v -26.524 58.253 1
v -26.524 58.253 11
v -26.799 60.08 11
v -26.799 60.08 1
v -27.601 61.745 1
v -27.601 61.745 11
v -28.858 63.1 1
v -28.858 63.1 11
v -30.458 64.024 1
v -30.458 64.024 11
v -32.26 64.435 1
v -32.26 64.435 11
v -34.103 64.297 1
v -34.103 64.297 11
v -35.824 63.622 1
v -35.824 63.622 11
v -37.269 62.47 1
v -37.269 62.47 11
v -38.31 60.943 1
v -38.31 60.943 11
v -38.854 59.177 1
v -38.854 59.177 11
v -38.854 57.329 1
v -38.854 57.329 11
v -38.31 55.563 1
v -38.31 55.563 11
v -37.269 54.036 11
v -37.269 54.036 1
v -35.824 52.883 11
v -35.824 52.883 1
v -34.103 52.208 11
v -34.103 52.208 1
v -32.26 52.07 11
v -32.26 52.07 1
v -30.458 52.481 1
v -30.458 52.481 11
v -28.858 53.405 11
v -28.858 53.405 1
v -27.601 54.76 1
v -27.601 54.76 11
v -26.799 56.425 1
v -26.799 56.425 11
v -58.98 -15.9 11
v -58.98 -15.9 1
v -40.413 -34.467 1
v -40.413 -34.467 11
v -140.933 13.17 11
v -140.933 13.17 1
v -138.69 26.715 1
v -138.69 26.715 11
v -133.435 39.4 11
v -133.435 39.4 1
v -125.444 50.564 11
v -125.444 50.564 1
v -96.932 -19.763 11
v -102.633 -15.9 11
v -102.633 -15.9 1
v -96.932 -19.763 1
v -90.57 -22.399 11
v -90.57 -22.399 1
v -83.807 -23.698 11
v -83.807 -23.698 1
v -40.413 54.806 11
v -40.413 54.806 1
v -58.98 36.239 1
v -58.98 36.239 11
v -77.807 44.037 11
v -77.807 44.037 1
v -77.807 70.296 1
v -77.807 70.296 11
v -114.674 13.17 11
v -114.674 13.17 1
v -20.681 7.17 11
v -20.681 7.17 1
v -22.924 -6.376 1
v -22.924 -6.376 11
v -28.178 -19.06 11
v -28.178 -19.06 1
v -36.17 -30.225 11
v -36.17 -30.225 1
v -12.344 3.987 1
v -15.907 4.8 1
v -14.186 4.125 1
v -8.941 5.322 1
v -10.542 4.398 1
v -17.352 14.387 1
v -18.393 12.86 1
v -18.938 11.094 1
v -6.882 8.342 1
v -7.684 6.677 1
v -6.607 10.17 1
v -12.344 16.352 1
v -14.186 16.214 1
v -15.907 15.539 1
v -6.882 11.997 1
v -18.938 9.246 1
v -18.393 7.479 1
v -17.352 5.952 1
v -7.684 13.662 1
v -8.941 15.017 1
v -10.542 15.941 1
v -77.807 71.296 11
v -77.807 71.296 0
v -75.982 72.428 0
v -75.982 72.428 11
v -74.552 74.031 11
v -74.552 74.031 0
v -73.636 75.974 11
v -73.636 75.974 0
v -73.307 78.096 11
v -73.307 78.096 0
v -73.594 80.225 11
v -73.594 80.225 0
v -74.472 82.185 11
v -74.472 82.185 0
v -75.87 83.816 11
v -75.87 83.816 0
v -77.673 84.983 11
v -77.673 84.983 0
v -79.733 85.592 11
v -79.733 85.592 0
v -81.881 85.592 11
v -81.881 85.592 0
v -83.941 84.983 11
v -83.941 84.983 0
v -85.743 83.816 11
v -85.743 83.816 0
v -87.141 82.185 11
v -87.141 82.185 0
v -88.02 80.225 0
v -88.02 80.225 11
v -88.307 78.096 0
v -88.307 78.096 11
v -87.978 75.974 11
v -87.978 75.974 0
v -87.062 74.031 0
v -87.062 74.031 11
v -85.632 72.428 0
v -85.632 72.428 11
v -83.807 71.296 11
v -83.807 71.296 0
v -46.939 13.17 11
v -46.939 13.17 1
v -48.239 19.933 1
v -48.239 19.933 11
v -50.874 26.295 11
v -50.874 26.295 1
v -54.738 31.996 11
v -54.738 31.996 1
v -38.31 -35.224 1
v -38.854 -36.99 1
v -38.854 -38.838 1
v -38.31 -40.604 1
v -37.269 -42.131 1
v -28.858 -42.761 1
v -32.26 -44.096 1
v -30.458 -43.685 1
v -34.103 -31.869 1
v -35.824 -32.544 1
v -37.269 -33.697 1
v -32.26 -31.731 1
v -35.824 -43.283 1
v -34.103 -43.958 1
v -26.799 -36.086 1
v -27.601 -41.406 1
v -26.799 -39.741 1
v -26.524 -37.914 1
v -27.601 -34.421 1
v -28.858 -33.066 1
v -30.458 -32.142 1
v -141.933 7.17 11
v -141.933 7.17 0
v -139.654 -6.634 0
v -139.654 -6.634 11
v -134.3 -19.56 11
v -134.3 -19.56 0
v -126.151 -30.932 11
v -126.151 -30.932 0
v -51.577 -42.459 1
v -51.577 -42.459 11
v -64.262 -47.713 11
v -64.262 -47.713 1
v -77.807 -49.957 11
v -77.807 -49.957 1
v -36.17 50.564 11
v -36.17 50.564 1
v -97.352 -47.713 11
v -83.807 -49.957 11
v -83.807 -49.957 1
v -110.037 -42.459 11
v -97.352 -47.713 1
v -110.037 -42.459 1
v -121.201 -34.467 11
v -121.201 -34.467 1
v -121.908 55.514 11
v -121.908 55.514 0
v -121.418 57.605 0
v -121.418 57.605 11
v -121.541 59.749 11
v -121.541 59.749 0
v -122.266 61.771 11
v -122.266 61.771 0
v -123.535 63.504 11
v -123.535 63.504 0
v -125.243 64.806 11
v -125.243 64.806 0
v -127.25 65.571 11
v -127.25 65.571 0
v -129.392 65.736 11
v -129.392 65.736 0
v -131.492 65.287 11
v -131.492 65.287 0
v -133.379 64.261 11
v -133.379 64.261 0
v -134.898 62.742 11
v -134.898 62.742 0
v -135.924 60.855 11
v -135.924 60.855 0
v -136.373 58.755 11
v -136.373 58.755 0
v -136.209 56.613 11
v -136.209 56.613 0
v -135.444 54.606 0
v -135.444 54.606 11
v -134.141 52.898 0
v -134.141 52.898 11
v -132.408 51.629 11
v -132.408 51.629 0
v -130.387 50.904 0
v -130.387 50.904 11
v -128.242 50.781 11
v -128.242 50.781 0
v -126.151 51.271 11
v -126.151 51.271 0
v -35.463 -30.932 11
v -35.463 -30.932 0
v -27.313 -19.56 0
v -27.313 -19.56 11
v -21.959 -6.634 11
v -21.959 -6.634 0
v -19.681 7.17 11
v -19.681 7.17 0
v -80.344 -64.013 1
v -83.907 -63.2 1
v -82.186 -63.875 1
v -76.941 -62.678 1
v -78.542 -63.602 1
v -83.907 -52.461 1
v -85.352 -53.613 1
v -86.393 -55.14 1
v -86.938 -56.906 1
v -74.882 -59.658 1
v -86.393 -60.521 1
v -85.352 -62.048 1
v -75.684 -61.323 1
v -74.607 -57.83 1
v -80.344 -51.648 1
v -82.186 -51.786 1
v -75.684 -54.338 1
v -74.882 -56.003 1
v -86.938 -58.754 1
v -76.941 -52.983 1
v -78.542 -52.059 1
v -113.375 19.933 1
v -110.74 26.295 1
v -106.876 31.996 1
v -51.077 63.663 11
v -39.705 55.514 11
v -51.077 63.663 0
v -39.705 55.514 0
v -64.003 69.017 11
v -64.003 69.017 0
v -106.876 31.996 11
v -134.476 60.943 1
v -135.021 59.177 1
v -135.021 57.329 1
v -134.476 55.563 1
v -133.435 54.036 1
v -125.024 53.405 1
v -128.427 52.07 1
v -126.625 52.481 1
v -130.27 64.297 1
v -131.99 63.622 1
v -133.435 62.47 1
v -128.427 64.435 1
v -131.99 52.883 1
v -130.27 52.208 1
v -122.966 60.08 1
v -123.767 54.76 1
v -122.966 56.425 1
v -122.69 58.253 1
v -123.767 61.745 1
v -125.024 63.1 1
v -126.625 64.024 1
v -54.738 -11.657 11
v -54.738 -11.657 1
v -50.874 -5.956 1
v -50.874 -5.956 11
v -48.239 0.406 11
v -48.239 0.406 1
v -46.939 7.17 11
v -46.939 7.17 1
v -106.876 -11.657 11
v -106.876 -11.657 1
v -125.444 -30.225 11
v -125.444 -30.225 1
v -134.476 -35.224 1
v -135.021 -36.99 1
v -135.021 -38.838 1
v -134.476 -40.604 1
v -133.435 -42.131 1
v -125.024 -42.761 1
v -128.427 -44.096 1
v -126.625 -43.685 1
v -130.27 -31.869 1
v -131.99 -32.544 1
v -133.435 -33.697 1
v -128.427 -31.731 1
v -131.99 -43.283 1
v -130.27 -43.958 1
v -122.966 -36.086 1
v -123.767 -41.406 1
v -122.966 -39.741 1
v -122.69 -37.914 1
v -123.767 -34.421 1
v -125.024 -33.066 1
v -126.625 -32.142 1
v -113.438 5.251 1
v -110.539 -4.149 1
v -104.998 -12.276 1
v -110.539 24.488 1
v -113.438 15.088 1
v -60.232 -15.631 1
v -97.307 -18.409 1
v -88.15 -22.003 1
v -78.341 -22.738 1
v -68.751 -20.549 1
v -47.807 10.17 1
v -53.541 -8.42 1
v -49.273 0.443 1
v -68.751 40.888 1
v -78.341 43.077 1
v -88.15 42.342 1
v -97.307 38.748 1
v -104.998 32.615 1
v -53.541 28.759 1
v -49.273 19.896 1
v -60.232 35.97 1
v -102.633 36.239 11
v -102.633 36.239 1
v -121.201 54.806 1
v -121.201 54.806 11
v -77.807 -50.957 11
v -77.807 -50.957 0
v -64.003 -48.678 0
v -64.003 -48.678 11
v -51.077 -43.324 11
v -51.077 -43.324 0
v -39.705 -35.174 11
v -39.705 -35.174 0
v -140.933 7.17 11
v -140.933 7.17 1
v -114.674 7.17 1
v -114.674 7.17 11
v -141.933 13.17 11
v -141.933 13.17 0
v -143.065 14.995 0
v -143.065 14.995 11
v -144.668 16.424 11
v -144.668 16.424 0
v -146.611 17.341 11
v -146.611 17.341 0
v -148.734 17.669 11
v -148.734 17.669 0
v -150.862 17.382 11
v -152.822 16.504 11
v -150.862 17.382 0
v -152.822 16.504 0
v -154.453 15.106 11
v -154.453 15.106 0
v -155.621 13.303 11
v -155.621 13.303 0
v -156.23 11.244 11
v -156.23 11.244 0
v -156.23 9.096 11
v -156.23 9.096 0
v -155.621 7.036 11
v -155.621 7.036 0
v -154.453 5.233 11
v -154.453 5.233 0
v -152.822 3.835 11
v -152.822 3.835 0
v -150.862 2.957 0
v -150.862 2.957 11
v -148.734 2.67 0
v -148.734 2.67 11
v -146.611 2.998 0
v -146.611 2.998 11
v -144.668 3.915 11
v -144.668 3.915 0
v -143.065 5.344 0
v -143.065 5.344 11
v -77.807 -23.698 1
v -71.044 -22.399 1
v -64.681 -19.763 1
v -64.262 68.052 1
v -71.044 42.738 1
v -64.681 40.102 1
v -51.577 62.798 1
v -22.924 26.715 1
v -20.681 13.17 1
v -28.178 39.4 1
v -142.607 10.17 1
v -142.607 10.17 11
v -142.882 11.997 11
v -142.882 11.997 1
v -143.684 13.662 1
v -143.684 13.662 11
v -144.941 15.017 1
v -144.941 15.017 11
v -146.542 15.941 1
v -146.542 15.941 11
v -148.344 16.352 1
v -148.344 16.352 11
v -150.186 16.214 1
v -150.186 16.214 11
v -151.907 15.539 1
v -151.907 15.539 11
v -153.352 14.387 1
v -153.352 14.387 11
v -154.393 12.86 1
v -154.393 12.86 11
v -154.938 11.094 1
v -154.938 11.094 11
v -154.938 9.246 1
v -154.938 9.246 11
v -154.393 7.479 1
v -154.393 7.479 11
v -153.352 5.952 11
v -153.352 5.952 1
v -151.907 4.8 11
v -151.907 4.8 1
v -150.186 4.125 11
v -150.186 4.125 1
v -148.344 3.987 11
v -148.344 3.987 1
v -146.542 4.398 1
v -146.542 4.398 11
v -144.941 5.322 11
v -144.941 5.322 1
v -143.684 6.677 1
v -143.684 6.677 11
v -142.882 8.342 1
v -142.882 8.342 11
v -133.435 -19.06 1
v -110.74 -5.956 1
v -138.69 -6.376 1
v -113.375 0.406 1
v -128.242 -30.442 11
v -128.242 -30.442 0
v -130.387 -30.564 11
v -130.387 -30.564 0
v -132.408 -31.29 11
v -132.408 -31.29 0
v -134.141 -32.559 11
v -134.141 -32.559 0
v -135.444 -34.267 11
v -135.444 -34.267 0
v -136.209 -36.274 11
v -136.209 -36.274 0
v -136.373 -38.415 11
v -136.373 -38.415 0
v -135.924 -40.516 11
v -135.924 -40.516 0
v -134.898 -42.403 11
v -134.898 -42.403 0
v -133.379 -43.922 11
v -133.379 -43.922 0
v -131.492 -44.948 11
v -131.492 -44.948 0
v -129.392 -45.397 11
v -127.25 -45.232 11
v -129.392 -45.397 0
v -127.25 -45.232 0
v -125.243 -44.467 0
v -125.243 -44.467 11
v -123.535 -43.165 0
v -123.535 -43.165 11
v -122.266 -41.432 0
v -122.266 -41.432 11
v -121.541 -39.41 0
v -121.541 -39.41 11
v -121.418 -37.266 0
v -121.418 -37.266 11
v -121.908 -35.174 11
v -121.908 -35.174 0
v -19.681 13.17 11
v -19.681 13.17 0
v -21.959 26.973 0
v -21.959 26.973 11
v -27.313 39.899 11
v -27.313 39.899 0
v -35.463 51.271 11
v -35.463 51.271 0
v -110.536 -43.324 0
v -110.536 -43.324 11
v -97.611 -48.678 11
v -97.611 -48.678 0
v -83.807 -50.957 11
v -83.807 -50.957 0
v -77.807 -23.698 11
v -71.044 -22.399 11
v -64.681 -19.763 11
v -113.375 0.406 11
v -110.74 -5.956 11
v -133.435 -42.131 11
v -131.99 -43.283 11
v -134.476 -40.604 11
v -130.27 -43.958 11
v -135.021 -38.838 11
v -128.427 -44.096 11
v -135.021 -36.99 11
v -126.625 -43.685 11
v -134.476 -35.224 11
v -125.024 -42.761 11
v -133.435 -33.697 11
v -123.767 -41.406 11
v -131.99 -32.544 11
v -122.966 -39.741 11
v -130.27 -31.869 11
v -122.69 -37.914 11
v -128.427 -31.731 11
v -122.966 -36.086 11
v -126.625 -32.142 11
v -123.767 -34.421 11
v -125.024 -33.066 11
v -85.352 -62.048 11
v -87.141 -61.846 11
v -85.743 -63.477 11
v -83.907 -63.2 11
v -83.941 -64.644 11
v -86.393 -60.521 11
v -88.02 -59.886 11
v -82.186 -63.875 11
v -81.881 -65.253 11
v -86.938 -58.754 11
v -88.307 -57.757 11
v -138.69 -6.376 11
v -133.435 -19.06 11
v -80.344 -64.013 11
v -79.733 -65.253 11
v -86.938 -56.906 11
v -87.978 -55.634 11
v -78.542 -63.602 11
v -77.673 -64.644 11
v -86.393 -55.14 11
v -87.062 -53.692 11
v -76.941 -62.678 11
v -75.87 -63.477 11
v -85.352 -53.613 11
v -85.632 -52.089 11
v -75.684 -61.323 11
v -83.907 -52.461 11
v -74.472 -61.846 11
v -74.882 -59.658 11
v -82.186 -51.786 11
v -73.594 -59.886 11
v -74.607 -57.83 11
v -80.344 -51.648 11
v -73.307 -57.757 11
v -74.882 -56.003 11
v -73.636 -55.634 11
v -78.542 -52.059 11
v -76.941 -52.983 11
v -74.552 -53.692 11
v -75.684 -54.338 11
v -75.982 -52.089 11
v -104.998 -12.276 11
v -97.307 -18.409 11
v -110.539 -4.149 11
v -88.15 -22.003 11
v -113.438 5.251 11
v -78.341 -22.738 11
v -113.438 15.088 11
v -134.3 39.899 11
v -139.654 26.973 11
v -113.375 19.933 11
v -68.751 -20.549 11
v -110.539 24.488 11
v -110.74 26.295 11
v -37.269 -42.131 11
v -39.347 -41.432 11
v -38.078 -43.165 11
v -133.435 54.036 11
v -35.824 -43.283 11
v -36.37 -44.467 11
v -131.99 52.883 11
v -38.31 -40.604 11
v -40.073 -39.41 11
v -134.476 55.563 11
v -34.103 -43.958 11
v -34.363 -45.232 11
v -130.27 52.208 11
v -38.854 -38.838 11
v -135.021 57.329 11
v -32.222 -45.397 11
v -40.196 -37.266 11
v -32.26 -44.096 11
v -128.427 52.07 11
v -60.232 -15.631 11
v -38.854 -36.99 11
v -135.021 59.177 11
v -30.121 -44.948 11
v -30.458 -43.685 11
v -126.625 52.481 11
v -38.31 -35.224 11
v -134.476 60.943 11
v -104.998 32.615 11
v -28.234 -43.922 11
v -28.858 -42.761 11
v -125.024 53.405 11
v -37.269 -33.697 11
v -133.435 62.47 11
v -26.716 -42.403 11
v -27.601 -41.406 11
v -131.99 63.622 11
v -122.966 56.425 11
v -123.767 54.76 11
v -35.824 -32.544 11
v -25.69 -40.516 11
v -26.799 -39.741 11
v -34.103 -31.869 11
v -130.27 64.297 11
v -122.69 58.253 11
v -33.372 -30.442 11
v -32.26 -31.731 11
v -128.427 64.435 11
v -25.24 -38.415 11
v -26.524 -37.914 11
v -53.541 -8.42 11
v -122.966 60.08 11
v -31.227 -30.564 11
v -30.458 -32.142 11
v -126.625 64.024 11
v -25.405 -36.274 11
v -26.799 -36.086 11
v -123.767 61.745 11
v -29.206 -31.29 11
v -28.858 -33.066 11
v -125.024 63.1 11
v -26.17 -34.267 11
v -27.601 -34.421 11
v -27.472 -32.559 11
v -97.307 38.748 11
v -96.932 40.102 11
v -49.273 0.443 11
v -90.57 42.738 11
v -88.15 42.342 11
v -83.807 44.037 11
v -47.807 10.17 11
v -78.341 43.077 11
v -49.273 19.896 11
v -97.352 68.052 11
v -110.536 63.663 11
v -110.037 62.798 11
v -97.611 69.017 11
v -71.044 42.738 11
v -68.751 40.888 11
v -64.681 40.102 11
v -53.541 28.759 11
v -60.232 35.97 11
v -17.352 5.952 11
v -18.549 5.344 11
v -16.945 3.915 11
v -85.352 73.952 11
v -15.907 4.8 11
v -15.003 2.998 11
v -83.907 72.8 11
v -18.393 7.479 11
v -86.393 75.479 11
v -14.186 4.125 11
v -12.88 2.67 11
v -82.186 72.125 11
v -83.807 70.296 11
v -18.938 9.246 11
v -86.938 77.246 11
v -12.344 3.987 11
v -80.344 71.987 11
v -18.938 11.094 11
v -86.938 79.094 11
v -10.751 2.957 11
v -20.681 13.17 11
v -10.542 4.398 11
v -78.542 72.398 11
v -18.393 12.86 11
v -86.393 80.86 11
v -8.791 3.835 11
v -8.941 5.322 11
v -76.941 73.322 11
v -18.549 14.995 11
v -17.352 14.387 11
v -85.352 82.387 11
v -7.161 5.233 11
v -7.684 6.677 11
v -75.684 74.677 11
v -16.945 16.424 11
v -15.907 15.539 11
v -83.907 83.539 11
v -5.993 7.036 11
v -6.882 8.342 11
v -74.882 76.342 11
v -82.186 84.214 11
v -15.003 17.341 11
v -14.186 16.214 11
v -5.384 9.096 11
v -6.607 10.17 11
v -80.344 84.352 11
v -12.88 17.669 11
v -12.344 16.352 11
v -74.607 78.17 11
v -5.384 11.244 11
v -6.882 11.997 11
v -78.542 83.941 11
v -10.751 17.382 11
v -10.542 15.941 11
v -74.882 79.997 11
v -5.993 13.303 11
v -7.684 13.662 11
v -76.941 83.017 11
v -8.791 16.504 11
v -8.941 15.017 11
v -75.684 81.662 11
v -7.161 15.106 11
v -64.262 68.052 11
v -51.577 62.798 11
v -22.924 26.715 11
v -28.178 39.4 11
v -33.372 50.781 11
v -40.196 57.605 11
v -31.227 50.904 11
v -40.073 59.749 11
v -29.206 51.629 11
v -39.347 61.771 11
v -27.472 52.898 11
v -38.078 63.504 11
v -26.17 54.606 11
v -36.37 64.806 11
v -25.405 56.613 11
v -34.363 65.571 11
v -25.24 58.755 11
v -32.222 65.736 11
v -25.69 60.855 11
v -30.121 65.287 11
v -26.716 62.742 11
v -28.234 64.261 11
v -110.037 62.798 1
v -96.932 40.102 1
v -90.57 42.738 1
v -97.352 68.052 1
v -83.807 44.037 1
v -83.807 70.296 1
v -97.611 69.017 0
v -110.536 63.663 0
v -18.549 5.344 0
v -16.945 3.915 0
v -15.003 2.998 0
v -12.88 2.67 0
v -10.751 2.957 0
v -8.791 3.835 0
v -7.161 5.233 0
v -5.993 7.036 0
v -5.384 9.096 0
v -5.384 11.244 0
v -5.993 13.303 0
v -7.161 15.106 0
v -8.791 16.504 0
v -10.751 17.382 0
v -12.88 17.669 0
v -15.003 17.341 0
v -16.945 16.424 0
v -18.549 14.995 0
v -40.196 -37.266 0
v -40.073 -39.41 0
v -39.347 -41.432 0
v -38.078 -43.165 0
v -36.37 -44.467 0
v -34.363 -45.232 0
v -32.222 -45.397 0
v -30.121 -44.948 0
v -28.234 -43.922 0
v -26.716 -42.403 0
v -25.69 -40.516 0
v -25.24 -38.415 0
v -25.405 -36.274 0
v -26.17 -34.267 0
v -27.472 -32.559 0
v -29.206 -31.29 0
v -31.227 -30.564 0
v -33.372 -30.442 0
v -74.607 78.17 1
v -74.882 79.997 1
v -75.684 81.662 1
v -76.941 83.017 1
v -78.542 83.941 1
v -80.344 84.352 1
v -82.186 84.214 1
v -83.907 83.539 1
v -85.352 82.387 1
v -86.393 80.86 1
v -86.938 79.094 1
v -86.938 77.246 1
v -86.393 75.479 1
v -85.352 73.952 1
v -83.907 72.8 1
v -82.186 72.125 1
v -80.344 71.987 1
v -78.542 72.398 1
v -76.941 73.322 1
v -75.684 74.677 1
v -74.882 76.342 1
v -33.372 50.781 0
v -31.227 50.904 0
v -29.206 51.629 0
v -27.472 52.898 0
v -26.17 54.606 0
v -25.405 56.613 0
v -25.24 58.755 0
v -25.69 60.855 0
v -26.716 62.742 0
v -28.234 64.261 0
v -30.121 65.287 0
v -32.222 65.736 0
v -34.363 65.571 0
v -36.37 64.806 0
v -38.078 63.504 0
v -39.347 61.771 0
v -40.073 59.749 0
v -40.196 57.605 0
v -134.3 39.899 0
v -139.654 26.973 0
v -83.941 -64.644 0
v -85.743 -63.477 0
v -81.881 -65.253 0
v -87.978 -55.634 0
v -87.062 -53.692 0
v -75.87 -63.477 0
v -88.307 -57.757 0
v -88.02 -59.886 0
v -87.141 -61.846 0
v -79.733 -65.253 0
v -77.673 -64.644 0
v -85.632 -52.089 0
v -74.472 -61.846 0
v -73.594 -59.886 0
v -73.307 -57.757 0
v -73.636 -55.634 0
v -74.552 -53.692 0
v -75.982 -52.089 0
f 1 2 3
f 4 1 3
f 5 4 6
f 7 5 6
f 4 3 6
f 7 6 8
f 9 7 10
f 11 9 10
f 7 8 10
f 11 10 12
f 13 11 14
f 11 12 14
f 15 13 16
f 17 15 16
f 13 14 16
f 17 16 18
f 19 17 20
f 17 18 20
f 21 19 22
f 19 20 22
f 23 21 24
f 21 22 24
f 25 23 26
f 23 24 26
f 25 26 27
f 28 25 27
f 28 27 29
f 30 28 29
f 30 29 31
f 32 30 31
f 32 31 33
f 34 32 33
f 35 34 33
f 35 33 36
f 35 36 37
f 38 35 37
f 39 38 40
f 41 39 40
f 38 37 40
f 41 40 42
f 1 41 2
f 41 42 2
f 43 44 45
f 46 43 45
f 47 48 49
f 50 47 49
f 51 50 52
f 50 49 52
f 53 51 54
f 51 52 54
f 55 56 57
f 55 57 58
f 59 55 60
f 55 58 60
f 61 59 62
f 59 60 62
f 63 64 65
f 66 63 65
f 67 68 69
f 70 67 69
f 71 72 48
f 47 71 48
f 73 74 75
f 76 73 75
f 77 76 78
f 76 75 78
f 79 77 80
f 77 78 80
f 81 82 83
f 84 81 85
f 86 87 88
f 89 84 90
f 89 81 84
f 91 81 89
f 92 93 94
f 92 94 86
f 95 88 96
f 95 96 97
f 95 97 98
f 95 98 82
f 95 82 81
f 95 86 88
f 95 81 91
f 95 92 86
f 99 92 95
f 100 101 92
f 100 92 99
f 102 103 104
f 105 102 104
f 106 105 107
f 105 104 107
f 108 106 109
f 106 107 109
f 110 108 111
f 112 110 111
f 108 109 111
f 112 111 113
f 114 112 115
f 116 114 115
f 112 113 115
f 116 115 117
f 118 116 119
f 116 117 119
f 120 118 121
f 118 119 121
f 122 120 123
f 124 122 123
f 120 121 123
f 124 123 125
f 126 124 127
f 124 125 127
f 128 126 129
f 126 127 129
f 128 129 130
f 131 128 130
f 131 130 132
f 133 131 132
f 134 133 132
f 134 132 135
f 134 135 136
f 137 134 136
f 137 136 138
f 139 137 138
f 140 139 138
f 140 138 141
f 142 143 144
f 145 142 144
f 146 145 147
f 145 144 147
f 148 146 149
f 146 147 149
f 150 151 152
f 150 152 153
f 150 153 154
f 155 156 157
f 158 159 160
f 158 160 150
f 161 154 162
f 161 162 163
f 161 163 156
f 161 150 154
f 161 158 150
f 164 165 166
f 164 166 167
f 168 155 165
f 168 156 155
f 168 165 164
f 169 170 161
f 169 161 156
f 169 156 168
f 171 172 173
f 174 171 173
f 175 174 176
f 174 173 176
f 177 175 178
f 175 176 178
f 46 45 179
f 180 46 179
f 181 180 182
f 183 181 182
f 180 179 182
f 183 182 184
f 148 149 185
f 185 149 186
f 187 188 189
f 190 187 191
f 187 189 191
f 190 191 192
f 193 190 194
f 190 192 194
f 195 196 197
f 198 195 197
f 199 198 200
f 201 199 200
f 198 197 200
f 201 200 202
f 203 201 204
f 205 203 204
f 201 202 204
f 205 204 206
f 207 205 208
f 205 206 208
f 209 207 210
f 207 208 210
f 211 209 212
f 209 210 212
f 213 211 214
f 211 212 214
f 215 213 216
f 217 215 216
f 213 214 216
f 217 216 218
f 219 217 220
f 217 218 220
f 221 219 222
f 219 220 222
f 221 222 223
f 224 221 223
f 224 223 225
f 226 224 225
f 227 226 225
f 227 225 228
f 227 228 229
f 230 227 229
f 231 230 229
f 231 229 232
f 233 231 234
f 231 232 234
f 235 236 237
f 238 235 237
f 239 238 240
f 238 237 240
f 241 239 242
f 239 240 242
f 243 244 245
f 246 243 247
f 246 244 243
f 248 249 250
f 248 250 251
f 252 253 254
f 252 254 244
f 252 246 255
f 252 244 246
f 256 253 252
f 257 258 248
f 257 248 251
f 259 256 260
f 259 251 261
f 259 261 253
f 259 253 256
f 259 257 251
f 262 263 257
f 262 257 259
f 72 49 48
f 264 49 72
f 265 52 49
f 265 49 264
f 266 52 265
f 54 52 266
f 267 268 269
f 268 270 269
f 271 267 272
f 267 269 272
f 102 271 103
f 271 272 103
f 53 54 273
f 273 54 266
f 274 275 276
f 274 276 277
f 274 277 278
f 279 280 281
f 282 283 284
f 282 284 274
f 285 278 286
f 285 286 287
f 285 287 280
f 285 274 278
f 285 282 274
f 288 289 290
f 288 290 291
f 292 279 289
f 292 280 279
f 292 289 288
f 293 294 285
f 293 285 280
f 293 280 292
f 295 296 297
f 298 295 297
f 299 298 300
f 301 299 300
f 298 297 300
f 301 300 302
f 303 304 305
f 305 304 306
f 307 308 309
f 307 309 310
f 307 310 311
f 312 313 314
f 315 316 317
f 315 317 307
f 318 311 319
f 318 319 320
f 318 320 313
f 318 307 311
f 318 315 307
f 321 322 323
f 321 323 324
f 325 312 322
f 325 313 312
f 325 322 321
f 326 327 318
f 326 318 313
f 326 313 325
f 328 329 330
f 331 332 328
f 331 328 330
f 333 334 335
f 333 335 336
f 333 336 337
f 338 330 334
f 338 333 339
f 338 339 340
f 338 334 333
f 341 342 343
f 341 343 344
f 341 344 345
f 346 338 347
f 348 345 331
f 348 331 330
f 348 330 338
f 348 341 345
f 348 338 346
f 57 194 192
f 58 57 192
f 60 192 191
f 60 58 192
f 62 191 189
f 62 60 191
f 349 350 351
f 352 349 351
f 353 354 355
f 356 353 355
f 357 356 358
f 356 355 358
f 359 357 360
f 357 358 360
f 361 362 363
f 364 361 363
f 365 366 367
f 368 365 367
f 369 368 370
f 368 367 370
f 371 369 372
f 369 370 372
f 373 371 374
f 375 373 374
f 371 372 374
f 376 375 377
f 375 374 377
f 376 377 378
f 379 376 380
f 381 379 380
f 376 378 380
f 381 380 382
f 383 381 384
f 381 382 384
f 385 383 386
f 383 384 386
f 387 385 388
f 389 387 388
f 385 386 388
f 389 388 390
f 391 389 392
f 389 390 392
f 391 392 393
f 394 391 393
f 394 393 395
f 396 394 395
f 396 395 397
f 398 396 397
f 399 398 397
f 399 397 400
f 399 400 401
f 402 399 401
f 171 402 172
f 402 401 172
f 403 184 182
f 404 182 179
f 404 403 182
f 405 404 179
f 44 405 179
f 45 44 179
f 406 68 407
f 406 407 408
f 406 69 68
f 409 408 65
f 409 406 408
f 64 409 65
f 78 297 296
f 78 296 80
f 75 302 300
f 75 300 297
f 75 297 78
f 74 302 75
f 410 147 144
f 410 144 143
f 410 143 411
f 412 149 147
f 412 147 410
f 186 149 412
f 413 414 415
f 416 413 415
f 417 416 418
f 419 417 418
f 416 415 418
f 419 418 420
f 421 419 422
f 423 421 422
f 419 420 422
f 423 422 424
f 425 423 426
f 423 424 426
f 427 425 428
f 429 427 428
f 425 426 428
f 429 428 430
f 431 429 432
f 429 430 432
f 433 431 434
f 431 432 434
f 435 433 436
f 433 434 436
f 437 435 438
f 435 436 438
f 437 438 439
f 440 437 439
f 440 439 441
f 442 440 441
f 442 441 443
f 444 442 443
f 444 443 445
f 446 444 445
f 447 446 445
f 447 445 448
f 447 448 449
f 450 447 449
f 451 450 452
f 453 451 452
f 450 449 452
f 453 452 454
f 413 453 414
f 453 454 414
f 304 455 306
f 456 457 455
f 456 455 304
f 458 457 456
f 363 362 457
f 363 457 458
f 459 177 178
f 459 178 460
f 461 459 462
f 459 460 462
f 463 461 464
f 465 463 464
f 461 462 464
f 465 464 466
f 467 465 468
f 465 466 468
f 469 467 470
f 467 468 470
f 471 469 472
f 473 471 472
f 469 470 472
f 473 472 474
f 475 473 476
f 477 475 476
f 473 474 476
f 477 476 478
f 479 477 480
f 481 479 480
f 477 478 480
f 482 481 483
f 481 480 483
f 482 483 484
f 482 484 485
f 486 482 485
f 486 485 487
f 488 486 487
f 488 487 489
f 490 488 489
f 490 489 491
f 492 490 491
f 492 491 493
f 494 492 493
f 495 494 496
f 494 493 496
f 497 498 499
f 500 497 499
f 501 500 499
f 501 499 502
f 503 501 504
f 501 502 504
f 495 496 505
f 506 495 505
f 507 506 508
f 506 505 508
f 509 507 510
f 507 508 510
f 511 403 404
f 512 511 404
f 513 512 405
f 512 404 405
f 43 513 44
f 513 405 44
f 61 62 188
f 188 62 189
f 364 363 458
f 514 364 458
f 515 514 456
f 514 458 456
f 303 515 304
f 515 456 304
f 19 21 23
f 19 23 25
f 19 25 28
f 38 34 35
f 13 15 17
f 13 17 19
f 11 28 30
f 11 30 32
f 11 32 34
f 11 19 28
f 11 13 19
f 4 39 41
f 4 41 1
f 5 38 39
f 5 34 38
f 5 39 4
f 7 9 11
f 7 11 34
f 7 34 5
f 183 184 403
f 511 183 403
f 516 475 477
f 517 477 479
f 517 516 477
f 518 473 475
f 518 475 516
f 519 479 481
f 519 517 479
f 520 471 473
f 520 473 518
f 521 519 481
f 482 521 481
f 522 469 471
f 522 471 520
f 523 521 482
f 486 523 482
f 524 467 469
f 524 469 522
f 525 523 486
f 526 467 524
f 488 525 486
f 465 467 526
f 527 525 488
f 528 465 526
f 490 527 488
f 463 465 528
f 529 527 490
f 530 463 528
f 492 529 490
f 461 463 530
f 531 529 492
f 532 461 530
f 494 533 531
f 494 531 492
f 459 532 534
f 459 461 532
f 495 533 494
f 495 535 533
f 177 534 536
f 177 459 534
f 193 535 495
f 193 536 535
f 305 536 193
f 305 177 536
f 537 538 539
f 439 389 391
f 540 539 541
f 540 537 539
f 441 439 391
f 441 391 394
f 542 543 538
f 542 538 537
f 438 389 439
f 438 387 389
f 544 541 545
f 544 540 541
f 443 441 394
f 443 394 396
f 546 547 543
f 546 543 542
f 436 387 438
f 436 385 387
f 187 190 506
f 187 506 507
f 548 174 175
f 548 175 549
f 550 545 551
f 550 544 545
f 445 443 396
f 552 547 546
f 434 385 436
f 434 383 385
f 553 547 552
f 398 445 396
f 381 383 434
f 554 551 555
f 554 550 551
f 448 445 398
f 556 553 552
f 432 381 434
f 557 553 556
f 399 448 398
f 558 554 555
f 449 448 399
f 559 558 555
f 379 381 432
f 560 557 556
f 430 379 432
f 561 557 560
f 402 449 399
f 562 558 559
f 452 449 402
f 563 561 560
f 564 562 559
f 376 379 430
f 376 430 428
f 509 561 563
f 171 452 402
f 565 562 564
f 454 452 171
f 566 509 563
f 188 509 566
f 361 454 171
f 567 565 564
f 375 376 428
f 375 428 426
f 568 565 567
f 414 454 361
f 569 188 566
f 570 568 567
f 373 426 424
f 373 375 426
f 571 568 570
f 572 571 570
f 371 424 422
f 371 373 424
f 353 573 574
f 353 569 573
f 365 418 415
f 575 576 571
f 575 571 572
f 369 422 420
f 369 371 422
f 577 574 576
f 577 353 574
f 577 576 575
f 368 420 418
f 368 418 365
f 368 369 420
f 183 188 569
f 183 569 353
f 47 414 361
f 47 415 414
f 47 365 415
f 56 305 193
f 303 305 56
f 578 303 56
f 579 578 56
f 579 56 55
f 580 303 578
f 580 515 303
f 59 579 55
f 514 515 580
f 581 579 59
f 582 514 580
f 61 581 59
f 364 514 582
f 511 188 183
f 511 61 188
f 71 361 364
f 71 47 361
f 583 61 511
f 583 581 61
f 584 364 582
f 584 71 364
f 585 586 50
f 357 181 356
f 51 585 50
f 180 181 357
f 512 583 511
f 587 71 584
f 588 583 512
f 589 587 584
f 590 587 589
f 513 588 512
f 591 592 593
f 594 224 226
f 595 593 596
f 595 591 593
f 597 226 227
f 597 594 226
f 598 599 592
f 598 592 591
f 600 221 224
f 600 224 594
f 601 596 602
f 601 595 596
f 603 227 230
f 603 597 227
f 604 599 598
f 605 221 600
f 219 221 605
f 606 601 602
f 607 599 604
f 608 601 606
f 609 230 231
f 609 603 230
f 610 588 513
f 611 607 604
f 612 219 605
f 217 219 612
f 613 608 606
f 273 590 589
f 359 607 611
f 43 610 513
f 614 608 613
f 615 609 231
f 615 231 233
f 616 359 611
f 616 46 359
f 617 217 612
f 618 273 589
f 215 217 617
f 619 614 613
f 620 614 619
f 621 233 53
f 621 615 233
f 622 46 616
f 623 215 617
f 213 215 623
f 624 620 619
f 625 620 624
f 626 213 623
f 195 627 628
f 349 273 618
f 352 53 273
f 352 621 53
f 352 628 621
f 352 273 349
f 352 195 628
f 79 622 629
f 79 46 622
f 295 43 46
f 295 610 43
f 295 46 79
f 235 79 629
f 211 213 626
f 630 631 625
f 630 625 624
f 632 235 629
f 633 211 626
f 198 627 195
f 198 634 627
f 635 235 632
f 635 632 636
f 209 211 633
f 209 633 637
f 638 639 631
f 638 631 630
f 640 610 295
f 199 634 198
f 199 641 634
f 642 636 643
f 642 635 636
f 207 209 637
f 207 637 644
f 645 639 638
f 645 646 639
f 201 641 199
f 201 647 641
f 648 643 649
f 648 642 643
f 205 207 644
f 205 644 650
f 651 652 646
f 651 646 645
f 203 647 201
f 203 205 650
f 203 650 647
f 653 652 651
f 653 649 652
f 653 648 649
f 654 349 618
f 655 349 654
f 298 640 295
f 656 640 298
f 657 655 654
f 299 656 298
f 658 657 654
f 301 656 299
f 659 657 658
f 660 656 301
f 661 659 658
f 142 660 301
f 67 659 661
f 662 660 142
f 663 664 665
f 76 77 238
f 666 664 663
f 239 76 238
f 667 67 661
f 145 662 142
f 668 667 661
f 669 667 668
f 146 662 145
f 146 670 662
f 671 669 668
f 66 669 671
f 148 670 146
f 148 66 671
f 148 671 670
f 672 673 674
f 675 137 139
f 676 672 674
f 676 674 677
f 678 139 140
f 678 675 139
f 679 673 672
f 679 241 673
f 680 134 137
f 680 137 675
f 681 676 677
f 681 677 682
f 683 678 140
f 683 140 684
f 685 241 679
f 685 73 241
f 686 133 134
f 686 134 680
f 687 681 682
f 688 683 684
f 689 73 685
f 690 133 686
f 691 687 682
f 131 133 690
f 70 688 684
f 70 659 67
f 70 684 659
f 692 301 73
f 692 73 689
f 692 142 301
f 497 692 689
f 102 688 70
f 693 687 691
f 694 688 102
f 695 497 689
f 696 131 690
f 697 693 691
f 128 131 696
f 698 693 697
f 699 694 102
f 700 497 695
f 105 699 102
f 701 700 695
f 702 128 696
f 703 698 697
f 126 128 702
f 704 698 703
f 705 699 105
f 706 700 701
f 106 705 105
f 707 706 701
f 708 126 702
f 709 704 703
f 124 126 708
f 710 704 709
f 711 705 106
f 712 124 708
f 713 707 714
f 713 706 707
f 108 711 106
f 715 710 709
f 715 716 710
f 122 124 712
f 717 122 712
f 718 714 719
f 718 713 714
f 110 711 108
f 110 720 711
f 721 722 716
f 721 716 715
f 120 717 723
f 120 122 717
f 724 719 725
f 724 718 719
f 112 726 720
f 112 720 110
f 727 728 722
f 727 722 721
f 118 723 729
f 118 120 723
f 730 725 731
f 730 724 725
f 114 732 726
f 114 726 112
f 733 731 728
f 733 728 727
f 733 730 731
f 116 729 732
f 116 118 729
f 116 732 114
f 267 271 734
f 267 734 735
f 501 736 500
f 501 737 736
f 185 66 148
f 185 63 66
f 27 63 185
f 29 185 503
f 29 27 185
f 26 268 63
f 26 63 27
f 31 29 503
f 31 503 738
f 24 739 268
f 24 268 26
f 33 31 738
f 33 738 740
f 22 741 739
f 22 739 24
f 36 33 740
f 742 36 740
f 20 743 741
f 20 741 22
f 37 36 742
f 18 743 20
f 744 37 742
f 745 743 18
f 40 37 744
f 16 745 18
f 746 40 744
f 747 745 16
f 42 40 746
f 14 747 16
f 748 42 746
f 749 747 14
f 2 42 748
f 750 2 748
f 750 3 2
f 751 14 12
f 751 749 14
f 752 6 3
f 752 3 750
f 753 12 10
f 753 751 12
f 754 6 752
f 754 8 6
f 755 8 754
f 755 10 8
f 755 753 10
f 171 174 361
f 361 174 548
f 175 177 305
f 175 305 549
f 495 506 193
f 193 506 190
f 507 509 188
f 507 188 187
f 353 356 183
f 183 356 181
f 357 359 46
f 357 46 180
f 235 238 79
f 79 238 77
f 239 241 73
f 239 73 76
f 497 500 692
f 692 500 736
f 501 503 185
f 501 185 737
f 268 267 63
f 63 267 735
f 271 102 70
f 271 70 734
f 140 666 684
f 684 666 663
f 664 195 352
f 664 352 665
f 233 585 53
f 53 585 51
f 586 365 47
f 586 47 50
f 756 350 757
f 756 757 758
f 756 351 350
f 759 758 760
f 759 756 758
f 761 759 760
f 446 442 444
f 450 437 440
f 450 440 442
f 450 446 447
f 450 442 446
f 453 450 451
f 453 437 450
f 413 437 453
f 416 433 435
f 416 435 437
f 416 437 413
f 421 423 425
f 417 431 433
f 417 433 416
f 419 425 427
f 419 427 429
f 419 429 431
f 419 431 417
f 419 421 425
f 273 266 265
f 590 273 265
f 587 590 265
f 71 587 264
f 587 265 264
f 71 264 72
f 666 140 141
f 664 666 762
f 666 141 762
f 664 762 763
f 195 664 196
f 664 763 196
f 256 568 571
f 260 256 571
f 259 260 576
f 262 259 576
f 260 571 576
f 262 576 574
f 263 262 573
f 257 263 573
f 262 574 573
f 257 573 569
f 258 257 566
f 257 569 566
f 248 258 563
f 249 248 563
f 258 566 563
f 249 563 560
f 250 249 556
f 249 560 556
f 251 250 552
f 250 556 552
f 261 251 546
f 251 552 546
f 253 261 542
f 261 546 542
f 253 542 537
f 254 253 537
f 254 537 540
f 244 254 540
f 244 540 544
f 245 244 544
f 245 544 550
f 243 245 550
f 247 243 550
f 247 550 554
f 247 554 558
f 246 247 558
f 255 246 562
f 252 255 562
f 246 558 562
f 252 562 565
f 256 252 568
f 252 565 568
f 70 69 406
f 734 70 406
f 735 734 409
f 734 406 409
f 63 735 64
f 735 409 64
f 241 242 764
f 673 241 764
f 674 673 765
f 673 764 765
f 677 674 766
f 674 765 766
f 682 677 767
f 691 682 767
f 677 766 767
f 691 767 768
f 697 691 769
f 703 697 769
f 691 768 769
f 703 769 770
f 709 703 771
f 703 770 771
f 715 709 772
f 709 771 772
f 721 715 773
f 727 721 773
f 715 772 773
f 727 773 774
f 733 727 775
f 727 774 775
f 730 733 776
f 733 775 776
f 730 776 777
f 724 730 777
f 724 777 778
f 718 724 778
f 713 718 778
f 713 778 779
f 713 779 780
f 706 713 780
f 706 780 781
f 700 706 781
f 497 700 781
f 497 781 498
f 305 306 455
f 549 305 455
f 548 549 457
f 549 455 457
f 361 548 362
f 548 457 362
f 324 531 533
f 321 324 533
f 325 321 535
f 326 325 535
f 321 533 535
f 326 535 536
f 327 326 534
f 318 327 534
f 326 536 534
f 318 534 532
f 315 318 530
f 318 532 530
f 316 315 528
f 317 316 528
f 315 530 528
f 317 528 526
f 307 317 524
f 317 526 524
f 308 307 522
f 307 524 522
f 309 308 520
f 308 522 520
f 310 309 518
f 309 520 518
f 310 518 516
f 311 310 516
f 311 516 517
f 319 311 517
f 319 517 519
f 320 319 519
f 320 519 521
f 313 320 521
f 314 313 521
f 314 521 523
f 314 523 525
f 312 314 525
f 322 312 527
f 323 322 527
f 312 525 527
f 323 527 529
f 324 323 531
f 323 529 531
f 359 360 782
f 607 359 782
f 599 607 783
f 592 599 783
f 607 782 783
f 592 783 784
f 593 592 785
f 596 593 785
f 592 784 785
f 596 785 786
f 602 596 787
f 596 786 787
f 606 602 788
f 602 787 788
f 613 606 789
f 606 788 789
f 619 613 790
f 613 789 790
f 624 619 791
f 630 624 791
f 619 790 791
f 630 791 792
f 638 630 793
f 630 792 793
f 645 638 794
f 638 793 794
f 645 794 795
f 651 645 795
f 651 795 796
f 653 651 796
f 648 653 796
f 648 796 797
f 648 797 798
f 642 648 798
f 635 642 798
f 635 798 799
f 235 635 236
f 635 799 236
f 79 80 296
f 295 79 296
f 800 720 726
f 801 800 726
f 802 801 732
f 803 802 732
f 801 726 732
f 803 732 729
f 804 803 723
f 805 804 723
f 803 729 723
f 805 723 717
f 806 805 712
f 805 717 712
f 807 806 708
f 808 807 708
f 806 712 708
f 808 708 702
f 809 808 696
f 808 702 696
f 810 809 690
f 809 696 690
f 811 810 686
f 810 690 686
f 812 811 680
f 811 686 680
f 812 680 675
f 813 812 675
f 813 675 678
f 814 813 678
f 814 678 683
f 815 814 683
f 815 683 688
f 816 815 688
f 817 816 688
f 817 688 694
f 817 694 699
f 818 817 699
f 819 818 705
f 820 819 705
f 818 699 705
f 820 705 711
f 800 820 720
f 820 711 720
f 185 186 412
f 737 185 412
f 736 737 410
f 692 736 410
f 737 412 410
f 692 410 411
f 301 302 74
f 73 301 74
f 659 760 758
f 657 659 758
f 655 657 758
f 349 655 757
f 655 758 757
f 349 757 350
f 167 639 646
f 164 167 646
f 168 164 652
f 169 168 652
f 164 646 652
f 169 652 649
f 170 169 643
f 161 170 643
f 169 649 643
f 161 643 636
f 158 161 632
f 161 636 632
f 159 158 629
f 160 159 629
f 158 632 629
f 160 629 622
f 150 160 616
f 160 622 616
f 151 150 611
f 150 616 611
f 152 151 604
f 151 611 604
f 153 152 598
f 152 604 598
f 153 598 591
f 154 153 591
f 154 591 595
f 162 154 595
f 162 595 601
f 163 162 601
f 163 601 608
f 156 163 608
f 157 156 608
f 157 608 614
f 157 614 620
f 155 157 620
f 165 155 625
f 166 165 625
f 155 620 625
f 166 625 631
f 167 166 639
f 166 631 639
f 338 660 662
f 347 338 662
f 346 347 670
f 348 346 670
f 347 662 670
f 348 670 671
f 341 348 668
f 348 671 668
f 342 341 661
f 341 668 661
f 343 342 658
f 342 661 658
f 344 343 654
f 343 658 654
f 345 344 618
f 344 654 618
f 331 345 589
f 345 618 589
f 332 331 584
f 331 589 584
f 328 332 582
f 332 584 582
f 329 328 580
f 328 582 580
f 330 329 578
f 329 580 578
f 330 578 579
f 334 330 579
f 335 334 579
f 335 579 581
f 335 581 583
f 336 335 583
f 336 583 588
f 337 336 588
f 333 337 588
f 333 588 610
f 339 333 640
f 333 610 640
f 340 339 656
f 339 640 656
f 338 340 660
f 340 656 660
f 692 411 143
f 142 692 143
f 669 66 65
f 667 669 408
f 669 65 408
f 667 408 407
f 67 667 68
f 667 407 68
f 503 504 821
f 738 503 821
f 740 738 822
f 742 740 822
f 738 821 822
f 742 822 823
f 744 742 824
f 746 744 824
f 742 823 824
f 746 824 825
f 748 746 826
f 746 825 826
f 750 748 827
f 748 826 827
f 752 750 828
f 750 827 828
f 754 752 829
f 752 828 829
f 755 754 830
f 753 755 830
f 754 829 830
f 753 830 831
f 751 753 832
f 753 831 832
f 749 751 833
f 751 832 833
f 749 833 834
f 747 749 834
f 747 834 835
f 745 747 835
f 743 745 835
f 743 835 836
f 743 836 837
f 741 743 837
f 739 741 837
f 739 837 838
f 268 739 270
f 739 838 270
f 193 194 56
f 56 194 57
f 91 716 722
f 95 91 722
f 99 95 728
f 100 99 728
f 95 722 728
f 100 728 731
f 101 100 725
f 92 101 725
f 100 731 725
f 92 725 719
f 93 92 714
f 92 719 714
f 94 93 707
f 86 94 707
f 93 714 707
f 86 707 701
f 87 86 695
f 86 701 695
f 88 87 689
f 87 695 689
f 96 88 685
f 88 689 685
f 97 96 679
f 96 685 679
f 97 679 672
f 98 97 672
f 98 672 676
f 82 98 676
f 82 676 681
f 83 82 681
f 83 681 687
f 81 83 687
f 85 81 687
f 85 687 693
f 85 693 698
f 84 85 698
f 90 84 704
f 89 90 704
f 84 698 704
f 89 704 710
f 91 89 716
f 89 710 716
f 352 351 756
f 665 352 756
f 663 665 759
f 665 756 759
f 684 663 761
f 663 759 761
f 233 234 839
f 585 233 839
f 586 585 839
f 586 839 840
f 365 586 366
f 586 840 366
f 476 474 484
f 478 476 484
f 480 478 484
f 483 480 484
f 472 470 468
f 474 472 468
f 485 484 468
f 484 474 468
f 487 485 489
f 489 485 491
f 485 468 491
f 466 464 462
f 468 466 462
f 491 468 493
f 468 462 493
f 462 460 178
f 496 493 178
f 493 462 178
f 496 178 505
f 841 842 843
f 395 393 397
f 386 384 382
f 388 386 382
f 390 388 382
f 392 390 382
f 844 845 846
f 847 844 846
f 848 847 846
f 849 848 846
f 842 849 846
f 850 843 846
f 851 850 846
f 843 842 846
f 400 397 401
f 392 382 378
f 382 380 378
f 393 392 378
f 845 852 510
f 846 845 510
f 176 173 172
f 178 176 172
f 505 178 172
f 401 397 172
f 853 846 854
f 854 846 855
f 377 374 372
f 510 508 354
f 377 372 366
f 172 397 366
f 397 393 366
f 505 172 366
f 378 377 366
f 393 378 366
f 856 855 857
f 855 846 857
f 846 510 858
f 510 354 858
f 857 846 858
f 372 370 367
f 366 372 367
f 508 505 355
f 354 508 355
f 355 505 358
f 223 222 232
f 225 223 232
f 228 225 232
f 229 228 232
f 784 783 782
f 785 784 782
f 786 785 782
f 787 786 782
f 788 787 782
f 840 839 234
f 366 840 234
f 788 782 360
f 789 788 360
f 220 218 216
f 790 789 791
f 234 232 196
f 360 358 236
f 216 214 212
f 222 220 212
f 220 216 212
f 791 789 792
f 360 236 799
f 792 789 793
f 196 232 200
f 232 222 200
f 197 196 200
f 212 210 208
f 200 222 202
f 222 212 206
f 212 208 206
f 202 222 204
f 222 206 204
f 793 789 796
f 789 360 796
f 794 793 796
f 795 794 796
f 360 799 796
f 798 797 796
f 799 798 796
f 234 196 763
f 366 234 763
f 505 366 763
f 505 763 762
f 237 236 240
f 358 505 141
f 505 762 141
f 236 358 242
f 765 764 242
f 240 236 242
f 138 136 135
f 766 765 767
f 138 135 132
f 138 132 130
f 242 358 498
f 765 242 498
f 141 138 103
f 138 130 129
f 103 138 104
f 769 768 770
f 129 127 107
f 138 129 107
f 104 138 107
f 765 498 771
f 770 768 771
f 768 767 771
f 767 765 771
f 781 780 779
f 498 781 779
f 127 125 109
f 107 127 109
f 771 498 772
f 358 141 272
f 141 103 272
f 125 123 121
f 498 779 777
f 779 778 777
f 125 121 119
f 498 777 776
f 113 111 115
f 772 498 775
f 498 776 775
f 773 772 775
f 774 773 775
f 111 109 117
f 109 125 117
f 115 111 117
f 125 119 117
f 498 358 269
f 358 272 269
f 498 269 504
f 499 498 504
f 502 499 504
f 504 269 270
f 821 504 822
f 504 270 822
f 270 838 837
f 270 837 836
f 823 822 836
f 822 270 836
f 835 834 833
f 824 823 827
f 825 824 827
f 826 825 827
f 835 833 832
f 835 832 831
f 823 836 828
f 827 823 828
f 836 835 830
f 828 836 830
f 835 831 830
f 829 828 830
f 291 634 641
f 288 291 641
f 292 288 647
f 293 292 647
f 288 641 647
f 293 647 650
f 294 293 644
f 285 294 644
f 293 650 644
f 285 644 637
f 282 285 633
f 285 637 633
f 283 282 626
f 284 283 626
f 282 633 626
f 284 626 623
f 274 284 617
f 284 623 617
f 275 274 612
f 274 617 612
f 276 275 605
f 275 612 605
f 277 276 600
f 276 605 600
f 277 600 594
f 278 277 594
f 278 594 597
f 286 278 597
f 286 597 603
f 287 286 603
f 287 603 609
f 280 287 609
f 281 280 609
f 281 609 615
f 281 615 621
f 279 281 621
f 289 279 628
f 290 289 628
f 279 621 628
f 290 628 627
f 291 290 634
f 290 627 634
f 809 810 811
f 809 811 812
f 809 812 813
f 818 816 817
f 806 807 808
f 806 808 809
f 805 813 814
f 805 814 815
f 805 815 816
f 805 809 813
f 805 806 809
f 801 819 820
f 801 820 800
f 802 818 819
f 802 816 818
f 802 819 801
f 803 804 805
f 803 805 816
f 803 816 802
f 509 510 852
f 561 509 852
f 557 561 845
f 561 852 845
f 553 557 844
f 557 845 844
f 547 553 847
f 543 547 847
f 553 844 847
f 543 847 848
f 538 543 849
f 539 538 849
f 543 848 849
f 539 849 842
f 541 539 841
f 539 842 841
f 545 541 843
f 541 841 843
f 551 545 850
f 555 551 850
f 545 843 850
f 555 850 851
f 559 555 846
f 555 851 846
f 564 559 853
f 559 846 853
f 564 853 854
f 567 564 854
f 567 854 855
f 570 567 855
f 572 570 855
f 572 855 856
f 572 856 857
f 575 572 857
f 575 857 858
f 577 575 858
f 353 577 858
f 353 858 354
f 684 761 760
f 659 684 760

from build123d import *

# Parameters (mm, degrees)
SALIENTE_EXTRUIR1_DEPTH = 11
CROQUIS2_R              = 33
CROQUIS2_R_2            = 6.2
CORTAR_EXTRUIR1_DEPTH   = 10
SALIENTE_EXTRUIR2_DEPTH = 1
SALIENTE_EXTRUIR3_DEPTH = 10


with BuildPart() as part:
    # Croquis1 → Saliente-Extruir1 (new body)
    with BuildSketch(Plane.XY):
        with BuildLine():
            Line((-39.705480667, 55.513594064), (-58.980326234, 36.238748497))
            ThreePointArc((-58.980326234, 36.238748497), (-67.79562922, 41.581472229), (-77.806865921, 44.036956568))
            Line((-77.806865921, 44.036956568), (-77.806865921, 71.295704582))
            ThreePointArc((-77.806865921, 71.295704582), (-80.806865921, 85.669568124), (-83.806865921, 71.295704582))
            Line((-83.806865921, 71.295704582), (-83.806865921, 44.036956568))
            ThreePointArc((-83.806865921, 44.036956568), (-93.818102621, 41.581472229), (-102.633405607, 36.238748497))
            Line((-102.633405607, 36.238748497), (-121.908251174, 55.513594064))
            ThreePointArc((-121.908251174, 55.513594064), (-134.1934279, 63.556130104), (-126.150891861, 51.270953377))
            Line((-126.150891861, 51.270953377), (-106.876046294, 31.99610781))
            ThreePointArc((-106.876046294, 31.99610781), (-112.218770026, 23.180804824), (-114.674254364, 13.169568124))
            Line((-114.674254364, 13.169568124), (-141.933002378, 13.169568124))
            ThreePointArc((-141.933002378, 13.169568124), (-156.306865921, 10.169568124), (-141.933002378, 7.169568124))
            Line((-141.933002378, 7.169568124), (-114.674254364, 7.169568124))
            ThreePointArc((-114.674254364, 7.169568124), (-112.218770026, -2.841668576), (-106.876046294, -11.656971562))
            Line((-106.876046294, -11.656971562), (-126.150891861, -30.931817129))
            ThreePointArc((-126.150891861, -30.931817129), (-134.1934279, -43.216993856), (-121.908251174, -35.174457817))
            Line((-121.908251174, -35.174457817), (-102.633405607, -15.899612249))
            ThreePointArc((-102.633405607, -15.899612249), (-93.818102621, -21.242335981), (-83.806865921, -23.69782032))
            Line((-83.806865921, -23.69782032), (-83.806865921, -50.956568334))
            ThreePointArc((-83.806865921, -50.956568334), (-80.806865921, -65.330431876), (-77.806865921, -50.956568334))
            Line((-77.806865921, -50.956568334), (-77.806865921, -23.69782032))
            ThreePointArc((-77.806865921, -23.69782032), (-67.79562922, -21.242335981), (-58.980326234, -15.899612249))
            Line((-58.980326234, -15.899612249), (-39.705480667, -35.174457816))
            ThreePointArc((-39.705480667, -35.174457816), (-27.420303941, -43.216993856), (-35.46283998, -30.931817129))
            Line((-35.46283998, -30.931817129), (-54.737685547, -11.656971562))
            ThreePointArc((-54.737685547, -11.656971562), (-49.394961815, -2.841668576), (-46.939477477, 7.169568124))
            Line((-46.939477477, 7.169568124), (-19.680729463, 7.169568124))
            ThreePointArc((-19.680729463, 7.169568124), (-5.306865921, 10.169568124), (-19.680729463, 13.169568124))
            Line((-19.680729463, 13.169568124), (-46.939477477, 13.169568124))
            ThreePointArc((-46.939477477, 13.169568124), (-49.394961815, 23.180804824), (-54.737685547, 31.99610781))
            Line((-54.737685547, 31.99610781), (-35.46283998, 51.270953377))
            ThreePointArc((-35.46283998, 51.270953377), (-27.420303941, 63.556130104), (-39.705480667, 55.513594064))
        make_face()
    extrude(amount=SALIENTE_EXTRUIR1_DEPTH)

    # Croquis2 → Cortar-Extruir1 (cut)
    with BuildSketch(Plane.XY.offset(11)):
        with Locations((-80.806865921, 10.169568124)):
            Circle(CROQUIS2_R)
        with Locations((-128.890127041, 58.252829245)):
            Circle(CROQUIS2_R_2)
        with Locations((-80.806865921, 78.169568124)):
            Circle(CROQUIS2_R_2)
        with Locations((-32.7236048, 58.252829245)):
            Circle(CROQUIS2_R_2)
        with Locations((-12.806865921, 10.169568124)):
            Circle(CROQUIS2_R_2)
        with Locations((-32.7236048, -37.913692997)):
            Circle(CROQUIS2_R_2)
        with Locations((-80.806865921, -57.830431876)):
            Circle(CROQUIS2_R_2)
        with Locations((-128.890127041, -37.913692997)):
            Circle(CROQUIS2_R_2)
        with Locations((-148.806865921, 10.169568124)):
            Circle(CROQUIS2_R_2)
    extrude(amount=-CORTAR_EXTRUIR1_DEPTH, mode=Mode.SUBTRACT)

    # Croquis3 → Saliente-Extruir2 (add)
    with BuildSketch(Plane(origin=(0, 0, 0), x_dir=(-1, 0, 0), z_dir=(0, 0, -1))):
        with BuildLine():
            Line((114.674254364, 7.169568124), (141.933002378, 7.169568124))
            ThreePointArc((141.933002378, 7.169568124), (137.348025794, -13.250547128), (126.150891861, -30.931817129))
            Line((126.150891861, -30.931817129), (106.876046294, -11.656971562))
            ThreePointArc((106.876046294, -11.656971562), (112.218770026, -2.841668576), (114.674254364, 7.169568124))
        make_face()
        with BuildLine():
            Line((102.633405607, -15.899612249), (121.908251174, -35.174457816))
            ThreePointArc((121.908251174, -35.174457816), (104.226981172, -46.371591749), (83.806865921, -50.956568334))
            Line((83.806865921, -50.956568334), (83.806865921, -23.69782032))
            ThreePointArc((83.806865921, -23.69782032), (93.818102621, -21.242335981), (102.633405607, -15.899612249))
        make_face()
        with BuildLine():
            Line((77.806865921, -23.69782032), (77.806865921, -50.956568334))
            ThreePointArc((77.806865921, -50.956568334), (57.386750669, -46.371591749), (39.705480667, -35.174457816))
            Line((39.705480667, -35.174457816), (58.980326234, -15.899612249))
            ThreePointArc((58.980326234, -15.899612249), (67.79562922, -21.242335981), (77.806865921, -23.69782032))
        make_face()
        with BuildLine():
            Line((54.737685547, -11.656971562), (35.46283998, -30.931817129))
            ThreePointArc((35.46283998, -30.931817129), (24.265706047, -13.250547128), (19.680729463, 7.169568124))
            Line((19.680729463, 7.169568124), (46.939477477, 7.169568124))
            ThreePointArc((46.939477477, 7.169568124), (49.394961815, -2.841668576), (54.737685547, -11.656971562))
        make_face()
        with BuildLine():
            Line((46.939477477, 13.169568124), (19.680729463, 13.169568124))
            ThreePointArc((19.680729463, 13.169568124), (24.265706047, 33.589683376), (35.46283998, 51.270953377))
            Line((35.46283998, 51.270953377), (54.737685547, 31.99610781))
            ThreePointArc((54.737685547, 31.99610781), (49.394961815, 23.180804824), (46.939477477, 13.169568124))
        make_face()
        with BuildLine():
            Line((58.980326234, 36.238748497), (39.705480667, 55.513594064))
            ThreePointArc((39.705480667, 55.513594064), (57.386750669, 66.710727997), (77.806865921, 71.295704581))
            Line((77.806865921, 71.295704581), (77.806865921, 44.036956568))
            ThreePointArc((77.806865921, 44.036956568), (67.79562922, 41.581472229), (58.980326234, 36.238748497))
        make_face()
        with BuildLine():
            Line((83.806865921, 44.036956568), (83.806865921, 71.295704581))
            ThreePointArc((83.806865921, 71.295704581), (104.226981172, 66.710727997), (121.908251174, 55.513594064))
            Line((121.908251174, 55.513594064), (102.633405607, 36.238748497))
            ThreePointArc((102.633405607, 36.238748497), (93.818102621, 41.581472229), (83.806865921, 44.036956568))
        make_face()
        with BuildLine():
            Line((106.876046294, 31.99610781), (126.150891861, 51.270953377))
            ThreePointArc((126.150891861, 51.270953377), (137.348025794, 33.589683376), (141.933002378, 13.169568124))
            Line((141.933002378, 13.169568124), (114.674254364, 13.169568124))
            ThreePointArc((114.674254364, 13.169568124), (112.218770026, 23.180804824), (106.876046294, 31.99610781))
        make_face()
    extrude(amount=-SALIENTE_EXTRUIR2_DEPTH)

    # Croquis4 → Saliente-Extruir3 (add)
    with BuildSketch(Plane.XY.offset(1)):
        with BuildLine():
            Line((-126.150891861, -30.931817129), (-125.44378508, -30.224710348))
            ThreePointArc((-125.44378508, -30.224710348), (-136.425275383, -12.868331393), (-140.933002378, 7.169568124))
            Line((-140.933002378, 7.169568124), (-141.933002378, 7.169568124))
            ThreePointArc((-141.933002378, 7.169568124), (-137.348025794, -13.250547128), (-126.150891861, -30.931817129))
        make_face()
        with BuildLine():
            Line((-141.933002378, 13.169568124), (-140.933002378, 13.169568124))
            ThreePointArc((-140.933002378, 13.169568124), (-136.425275383, 33.207467641), (-125.44378508, 50.563846596))
            Line((-125.44378508, 50.563846596), (-126.150891861, 51.270953377))
            ThreePointArc((-126.150891861, 51.270953377), (-137.348025794, 33.589683376), (-141.933002378, 13.169568124))
        make_face()
        with BuildLine():
            Line((-121.908251174, 55.513594064), (-121.201144393, 54.806487283))
            ThreePointArc((-121.201144393, 54.806487283), (-103.844765438, 65.787977587), (-83.806865921, 70.295704581))
            Line((-83.806865921, 70.295704581), (-83.806865921, 71.295704581))
            ThreePointArc((-83.806865921, 71.295704581), (-104.226981172, 66.710727997), (-121.908251174, 55.513594064))
        make_face()
        with BuildLine():
            Line((-77.806865921, 71.295704581), (-77.806865921, 70.295704581))
            ThreePointArc((-77.806865921, 70.295704581), (-57.768966404, 65.787977587), (-40.412587448, 54.806487283))
            Line((-40.412587448, 54.806487283), (-39.705480667, 55.513594064))
            ThreePointArc((-39.705480667, 55.513594064), (-57.386750669, 66.710727997), (-77.806865921, 71.295704581))
        make_face()
        with BuildLine():
            Line((-35.46283998, 51.270953377), (-36.169946761, 50.563846596))
            ThreePointArc((-36.169946761, 50.563846596), (-25.188456458, 33.207467641), (-20.680729463, 13.169568124))
            Line((-20.680729463, 13.169568124), (-19.680729463, 13.169568124))
            ThreePointArc((-19.680729463, 13.169568124), (-24.265706047, 33.589683376), (-35.46283998, 51.270953377))
        make_face()
        with BuildLine():
            Line((-19.680729463, 7.169568124), (-20.680729463, 7.169568124))
            ThreePointArc((-20.680729463, 7.169568124), (-25.188456458, -12.868331393), (-36.169946761, -30.224710348))
            Line((-36.169946761, -30.224710348), (-35.46283998, -30.931817129))
            ThreePointArc((-35.46283998, -30.931817129), (-24.265706047, -13.250547128), (-19.680729463, 7.169568124))
        make_face()
        with BuildLine():
            Line((-39.705480667, -35.174457816), (-40.412587448, -34.467351035))
            ThreePointArc((-40.412587448, -34.467351035), (-57.768966404, -45.448841339), (-77.806865921, -49.956568334))
            Line((-77.806865921, -49.956568334), (-77.806865921, -50.956568334))
            ThreePointArc((-77.806865921, -50.956568334), (-57.386750669, -46.371591749), (-39.705480667, -35.174457816))
        make_face()
        with BuildLine():
            Line((-83.806865921, -50.956568334), (-83.806865921, -49.956568334))
            ThreePointArc((-83.806865921, -49.956568334), (-103.844765438, -45.448841339), (-121.201144393, -34.467351035))
            Line((-121.201144393, -34.467351035), (-121.908251174, -35.174457816))
            ThreePointArc((-121.908251174, -35.174457816), (-104.226981172, -46.371591749), (-83.806865921, -50.956568334))
        make_face()
    extrude(amount=SALIENTE_EXTRUIR3_DEPTH)


solid = part.part
